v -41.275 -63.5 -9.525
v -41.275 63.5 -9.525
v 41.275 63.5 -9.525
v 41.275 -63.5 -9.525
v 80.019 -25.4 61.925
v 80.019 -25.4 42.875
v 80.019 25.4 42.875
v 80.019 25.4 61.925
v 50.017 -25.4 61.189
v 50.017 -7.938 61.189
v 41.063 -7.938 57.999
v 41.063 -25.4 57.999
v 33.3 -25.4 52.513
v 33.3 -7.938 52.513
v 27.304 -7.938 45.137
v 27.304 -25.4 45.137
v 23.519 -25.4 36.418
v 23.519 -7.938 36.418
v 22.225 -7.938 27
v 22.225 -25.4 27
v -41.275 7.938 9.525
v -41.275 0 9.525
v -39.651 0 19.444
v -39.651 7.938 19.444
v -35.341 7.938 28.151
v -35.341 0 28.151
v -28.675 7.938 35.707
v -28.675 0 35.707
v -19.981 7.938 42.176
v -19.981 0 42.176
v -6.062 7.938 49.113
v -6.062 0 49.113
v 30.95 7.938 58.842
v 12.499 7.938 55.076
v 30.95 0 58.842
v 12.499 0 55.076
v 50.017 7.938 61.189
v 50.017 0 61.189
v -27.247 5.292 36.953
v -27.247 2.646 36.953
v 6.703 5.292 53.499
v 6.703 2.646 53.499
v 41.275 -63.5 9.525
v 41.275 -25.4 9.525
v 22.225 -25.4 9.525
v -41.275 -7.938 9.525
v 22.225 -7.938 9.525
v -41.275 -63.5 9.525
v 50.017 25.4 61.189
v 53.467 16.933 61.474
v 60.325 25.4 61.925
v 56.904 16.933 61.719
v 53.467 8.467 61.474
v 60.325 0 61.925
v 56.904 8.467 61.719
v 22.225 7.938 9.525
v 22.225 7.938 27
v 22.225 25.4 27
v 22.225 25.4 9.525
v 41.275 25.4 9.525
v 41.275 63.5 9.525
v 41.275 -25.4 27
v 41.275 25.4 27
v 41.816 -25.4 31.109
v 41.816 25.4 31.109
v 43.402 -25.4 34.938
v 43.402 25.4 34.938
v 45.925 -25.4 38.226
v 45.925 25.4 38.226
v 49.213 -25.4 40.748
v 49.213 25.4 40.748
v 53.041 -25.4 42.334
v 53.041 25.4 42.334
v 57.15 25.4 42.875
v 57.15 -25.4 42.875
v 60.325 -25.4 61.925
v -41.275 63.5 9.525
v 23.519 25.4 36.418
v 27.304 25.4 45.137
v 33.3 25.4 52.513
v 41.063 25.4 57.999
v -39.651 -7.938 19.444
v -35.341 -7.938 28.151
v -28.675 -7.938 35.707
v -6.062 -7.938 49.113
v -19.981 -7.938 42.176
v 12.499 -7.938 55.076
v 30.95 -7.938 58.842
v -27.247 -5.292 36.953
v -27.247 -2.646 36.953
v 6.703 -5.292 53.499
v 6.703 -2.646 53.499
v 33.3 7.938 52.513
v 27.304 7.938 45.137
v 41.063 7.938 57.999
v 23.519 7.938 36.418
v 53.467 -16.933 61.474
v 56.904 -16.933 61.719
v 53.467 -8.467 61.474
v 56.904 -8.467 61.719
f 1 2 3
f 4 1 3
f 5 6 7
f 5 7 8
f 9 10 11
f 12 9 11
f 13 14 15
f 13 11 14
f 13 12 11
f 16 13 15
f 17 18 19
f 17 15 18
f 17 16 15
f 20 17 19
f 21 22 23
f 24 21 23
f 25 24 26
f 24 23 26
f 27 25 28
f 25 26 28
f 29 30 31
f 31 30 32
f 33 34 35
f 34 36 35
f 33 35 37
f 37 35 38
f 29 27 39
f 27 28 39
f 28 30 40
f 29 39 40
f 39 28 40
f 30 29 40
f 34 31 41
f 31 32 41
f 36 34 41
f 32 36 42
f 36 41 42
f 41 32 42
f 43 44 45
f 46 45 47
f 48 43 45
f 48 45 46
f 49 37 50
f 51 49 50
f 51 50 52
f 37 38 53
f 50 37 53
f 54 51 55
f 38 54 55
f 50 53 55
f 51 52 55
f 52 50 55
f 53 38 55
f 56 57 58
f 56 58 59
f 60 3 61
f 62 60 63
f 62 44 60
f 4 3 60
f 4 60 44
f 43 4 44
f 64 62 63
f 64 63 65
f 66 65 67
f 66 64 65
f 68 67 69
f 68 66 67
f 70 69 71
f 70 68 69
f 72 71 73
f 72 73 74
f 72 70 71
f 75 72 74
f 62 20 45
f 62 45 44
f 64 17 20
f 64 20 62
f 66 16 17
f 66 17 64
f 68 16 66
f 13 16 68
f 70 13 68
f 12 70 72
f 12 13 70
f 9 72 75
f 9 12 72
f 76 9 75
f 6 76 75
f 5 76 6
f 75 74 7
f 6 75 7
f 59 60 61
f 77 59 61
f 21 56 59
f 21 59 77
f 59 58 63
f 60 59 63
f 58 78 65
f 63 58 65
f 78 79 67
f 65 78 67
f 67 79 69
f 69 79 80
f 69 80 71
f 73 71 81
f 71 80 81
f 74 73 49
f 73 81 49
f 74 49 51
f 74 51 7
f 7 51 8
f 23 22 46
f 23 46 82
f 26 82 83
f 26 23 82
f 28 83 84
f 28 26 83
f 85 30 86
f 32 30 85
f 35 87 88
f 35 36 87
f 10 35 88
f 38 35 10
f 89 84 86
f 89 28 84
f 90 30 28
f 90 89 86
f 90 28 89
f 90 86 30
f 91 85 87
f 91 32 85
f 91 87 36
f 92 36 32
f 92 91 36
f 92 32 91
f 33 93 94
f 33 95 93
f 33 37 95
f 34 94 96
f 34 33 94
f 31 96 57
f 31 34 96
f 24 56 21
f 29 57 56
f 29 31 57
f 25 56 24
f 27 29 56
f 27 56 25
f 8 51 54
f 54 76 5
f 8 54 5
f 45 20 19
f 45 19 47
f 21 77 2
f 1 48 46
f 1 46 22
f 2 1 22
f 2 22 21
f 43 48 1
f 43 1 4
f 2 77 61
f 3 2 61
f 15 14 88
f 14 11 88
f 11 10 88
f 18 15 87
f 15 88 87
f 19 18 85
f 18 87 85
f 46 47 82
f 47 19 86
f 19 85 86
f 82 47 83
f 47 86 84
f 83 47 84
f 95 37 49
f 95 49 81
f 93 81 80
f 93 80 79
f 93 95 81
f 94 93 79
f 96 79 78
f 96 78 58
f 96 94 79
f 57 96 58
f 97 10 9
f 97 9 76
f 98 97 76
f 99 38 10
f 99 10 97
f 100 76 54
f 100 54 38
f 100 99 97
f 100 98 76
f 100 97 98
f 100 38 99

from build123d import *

# Parameters (mm, degrees)
F1_DEPTH = 63.5
F2_DEPTH = 25.4
F0_W     = 19.693976
F0_H     = 19.05
F3_DEPTH = 25.4
F4_DEPTH = 7.9375


with BuildPart() as f1:
    # F0 (on Front) → F1 (new body, symmetric)
    with BuildSketch(Plane.XZ):
        Polygon((-41.275, 9.525), (-41.275, -9.525), (41.275, -9.525), (41.275, 9.525), (22.225, 9.525), align=None)
    extrude(amount=F1_DEPTH, both=True)

    # F0 (on Front) → F2 (join, symmetric)
    with BuildSketch(Plane.XZ):
        with BuildLine():
            Line((22.225, 9.525), (41.275, 9.525))
            Line((41.275, 9.525), (41.275, 27.0002))
            ThreePointArc((41.275, 27.0002), (45.92468, 38.22552), (57.15, 42.8752))
            Line((57.15, 42.8752), (60.325, 42.8752))
            Line((60.325, 42.8752), (60.325, 61.9252))
            add(Edge.make_bspline(
                [(50.017181, 61.189065), (53.471327, 61.494815), (56.914684, 61.73877), (60.325, 61.9252)],
                knots=[106.078682, 106.078682, 106.078682, 106.078682, 114.316845, 114.316845, 114.316845, 114.316845], degree=3))
            ThreePointArc((50.017181, 61.189065), (30.049545, 49.030201), (22.225, 27.0002))
            Line((22.225, 27.0002), (22.225, 9.525))
        make_face()
    extrude(amount=F2_DEPTH, both=True)

    # F0 (on Front) → F3 (join, symmetric)
    with BuildSketch(Plane.XZ):
        with Locations((70.171988, 52.4002)):
            Rectangle(F0_W, F0_H)
    extrude(amount=F3_DEPTH, both=True)

    # F0 (on Front) → F4 (join, symmetric)
    with BuildSketch(Plane.XZ):
        with BuildLine():
            add(Edge.make_bspline(
                [(-41.275, 9.525), (-40.72633, 43.06928), (5.539875, 57.25208), (50.017181, 61.189065)],
                knots=[0, 0, 0, 0, 106.078682, 106.078682, 106.078682, 106.078682], degree=3))
            Line((-41.275, 9.525), (22.225, 9.525))
            Line((22.225, 9.525), (22.225, 27.0002))
            ThreePointArc((22.225, 27.0002), (30.049545, 49.030201), (50.017181, 61.189065))
        make_face()
    extrude(amount=F4_DEPTH, both=True)


solid = f1.part
